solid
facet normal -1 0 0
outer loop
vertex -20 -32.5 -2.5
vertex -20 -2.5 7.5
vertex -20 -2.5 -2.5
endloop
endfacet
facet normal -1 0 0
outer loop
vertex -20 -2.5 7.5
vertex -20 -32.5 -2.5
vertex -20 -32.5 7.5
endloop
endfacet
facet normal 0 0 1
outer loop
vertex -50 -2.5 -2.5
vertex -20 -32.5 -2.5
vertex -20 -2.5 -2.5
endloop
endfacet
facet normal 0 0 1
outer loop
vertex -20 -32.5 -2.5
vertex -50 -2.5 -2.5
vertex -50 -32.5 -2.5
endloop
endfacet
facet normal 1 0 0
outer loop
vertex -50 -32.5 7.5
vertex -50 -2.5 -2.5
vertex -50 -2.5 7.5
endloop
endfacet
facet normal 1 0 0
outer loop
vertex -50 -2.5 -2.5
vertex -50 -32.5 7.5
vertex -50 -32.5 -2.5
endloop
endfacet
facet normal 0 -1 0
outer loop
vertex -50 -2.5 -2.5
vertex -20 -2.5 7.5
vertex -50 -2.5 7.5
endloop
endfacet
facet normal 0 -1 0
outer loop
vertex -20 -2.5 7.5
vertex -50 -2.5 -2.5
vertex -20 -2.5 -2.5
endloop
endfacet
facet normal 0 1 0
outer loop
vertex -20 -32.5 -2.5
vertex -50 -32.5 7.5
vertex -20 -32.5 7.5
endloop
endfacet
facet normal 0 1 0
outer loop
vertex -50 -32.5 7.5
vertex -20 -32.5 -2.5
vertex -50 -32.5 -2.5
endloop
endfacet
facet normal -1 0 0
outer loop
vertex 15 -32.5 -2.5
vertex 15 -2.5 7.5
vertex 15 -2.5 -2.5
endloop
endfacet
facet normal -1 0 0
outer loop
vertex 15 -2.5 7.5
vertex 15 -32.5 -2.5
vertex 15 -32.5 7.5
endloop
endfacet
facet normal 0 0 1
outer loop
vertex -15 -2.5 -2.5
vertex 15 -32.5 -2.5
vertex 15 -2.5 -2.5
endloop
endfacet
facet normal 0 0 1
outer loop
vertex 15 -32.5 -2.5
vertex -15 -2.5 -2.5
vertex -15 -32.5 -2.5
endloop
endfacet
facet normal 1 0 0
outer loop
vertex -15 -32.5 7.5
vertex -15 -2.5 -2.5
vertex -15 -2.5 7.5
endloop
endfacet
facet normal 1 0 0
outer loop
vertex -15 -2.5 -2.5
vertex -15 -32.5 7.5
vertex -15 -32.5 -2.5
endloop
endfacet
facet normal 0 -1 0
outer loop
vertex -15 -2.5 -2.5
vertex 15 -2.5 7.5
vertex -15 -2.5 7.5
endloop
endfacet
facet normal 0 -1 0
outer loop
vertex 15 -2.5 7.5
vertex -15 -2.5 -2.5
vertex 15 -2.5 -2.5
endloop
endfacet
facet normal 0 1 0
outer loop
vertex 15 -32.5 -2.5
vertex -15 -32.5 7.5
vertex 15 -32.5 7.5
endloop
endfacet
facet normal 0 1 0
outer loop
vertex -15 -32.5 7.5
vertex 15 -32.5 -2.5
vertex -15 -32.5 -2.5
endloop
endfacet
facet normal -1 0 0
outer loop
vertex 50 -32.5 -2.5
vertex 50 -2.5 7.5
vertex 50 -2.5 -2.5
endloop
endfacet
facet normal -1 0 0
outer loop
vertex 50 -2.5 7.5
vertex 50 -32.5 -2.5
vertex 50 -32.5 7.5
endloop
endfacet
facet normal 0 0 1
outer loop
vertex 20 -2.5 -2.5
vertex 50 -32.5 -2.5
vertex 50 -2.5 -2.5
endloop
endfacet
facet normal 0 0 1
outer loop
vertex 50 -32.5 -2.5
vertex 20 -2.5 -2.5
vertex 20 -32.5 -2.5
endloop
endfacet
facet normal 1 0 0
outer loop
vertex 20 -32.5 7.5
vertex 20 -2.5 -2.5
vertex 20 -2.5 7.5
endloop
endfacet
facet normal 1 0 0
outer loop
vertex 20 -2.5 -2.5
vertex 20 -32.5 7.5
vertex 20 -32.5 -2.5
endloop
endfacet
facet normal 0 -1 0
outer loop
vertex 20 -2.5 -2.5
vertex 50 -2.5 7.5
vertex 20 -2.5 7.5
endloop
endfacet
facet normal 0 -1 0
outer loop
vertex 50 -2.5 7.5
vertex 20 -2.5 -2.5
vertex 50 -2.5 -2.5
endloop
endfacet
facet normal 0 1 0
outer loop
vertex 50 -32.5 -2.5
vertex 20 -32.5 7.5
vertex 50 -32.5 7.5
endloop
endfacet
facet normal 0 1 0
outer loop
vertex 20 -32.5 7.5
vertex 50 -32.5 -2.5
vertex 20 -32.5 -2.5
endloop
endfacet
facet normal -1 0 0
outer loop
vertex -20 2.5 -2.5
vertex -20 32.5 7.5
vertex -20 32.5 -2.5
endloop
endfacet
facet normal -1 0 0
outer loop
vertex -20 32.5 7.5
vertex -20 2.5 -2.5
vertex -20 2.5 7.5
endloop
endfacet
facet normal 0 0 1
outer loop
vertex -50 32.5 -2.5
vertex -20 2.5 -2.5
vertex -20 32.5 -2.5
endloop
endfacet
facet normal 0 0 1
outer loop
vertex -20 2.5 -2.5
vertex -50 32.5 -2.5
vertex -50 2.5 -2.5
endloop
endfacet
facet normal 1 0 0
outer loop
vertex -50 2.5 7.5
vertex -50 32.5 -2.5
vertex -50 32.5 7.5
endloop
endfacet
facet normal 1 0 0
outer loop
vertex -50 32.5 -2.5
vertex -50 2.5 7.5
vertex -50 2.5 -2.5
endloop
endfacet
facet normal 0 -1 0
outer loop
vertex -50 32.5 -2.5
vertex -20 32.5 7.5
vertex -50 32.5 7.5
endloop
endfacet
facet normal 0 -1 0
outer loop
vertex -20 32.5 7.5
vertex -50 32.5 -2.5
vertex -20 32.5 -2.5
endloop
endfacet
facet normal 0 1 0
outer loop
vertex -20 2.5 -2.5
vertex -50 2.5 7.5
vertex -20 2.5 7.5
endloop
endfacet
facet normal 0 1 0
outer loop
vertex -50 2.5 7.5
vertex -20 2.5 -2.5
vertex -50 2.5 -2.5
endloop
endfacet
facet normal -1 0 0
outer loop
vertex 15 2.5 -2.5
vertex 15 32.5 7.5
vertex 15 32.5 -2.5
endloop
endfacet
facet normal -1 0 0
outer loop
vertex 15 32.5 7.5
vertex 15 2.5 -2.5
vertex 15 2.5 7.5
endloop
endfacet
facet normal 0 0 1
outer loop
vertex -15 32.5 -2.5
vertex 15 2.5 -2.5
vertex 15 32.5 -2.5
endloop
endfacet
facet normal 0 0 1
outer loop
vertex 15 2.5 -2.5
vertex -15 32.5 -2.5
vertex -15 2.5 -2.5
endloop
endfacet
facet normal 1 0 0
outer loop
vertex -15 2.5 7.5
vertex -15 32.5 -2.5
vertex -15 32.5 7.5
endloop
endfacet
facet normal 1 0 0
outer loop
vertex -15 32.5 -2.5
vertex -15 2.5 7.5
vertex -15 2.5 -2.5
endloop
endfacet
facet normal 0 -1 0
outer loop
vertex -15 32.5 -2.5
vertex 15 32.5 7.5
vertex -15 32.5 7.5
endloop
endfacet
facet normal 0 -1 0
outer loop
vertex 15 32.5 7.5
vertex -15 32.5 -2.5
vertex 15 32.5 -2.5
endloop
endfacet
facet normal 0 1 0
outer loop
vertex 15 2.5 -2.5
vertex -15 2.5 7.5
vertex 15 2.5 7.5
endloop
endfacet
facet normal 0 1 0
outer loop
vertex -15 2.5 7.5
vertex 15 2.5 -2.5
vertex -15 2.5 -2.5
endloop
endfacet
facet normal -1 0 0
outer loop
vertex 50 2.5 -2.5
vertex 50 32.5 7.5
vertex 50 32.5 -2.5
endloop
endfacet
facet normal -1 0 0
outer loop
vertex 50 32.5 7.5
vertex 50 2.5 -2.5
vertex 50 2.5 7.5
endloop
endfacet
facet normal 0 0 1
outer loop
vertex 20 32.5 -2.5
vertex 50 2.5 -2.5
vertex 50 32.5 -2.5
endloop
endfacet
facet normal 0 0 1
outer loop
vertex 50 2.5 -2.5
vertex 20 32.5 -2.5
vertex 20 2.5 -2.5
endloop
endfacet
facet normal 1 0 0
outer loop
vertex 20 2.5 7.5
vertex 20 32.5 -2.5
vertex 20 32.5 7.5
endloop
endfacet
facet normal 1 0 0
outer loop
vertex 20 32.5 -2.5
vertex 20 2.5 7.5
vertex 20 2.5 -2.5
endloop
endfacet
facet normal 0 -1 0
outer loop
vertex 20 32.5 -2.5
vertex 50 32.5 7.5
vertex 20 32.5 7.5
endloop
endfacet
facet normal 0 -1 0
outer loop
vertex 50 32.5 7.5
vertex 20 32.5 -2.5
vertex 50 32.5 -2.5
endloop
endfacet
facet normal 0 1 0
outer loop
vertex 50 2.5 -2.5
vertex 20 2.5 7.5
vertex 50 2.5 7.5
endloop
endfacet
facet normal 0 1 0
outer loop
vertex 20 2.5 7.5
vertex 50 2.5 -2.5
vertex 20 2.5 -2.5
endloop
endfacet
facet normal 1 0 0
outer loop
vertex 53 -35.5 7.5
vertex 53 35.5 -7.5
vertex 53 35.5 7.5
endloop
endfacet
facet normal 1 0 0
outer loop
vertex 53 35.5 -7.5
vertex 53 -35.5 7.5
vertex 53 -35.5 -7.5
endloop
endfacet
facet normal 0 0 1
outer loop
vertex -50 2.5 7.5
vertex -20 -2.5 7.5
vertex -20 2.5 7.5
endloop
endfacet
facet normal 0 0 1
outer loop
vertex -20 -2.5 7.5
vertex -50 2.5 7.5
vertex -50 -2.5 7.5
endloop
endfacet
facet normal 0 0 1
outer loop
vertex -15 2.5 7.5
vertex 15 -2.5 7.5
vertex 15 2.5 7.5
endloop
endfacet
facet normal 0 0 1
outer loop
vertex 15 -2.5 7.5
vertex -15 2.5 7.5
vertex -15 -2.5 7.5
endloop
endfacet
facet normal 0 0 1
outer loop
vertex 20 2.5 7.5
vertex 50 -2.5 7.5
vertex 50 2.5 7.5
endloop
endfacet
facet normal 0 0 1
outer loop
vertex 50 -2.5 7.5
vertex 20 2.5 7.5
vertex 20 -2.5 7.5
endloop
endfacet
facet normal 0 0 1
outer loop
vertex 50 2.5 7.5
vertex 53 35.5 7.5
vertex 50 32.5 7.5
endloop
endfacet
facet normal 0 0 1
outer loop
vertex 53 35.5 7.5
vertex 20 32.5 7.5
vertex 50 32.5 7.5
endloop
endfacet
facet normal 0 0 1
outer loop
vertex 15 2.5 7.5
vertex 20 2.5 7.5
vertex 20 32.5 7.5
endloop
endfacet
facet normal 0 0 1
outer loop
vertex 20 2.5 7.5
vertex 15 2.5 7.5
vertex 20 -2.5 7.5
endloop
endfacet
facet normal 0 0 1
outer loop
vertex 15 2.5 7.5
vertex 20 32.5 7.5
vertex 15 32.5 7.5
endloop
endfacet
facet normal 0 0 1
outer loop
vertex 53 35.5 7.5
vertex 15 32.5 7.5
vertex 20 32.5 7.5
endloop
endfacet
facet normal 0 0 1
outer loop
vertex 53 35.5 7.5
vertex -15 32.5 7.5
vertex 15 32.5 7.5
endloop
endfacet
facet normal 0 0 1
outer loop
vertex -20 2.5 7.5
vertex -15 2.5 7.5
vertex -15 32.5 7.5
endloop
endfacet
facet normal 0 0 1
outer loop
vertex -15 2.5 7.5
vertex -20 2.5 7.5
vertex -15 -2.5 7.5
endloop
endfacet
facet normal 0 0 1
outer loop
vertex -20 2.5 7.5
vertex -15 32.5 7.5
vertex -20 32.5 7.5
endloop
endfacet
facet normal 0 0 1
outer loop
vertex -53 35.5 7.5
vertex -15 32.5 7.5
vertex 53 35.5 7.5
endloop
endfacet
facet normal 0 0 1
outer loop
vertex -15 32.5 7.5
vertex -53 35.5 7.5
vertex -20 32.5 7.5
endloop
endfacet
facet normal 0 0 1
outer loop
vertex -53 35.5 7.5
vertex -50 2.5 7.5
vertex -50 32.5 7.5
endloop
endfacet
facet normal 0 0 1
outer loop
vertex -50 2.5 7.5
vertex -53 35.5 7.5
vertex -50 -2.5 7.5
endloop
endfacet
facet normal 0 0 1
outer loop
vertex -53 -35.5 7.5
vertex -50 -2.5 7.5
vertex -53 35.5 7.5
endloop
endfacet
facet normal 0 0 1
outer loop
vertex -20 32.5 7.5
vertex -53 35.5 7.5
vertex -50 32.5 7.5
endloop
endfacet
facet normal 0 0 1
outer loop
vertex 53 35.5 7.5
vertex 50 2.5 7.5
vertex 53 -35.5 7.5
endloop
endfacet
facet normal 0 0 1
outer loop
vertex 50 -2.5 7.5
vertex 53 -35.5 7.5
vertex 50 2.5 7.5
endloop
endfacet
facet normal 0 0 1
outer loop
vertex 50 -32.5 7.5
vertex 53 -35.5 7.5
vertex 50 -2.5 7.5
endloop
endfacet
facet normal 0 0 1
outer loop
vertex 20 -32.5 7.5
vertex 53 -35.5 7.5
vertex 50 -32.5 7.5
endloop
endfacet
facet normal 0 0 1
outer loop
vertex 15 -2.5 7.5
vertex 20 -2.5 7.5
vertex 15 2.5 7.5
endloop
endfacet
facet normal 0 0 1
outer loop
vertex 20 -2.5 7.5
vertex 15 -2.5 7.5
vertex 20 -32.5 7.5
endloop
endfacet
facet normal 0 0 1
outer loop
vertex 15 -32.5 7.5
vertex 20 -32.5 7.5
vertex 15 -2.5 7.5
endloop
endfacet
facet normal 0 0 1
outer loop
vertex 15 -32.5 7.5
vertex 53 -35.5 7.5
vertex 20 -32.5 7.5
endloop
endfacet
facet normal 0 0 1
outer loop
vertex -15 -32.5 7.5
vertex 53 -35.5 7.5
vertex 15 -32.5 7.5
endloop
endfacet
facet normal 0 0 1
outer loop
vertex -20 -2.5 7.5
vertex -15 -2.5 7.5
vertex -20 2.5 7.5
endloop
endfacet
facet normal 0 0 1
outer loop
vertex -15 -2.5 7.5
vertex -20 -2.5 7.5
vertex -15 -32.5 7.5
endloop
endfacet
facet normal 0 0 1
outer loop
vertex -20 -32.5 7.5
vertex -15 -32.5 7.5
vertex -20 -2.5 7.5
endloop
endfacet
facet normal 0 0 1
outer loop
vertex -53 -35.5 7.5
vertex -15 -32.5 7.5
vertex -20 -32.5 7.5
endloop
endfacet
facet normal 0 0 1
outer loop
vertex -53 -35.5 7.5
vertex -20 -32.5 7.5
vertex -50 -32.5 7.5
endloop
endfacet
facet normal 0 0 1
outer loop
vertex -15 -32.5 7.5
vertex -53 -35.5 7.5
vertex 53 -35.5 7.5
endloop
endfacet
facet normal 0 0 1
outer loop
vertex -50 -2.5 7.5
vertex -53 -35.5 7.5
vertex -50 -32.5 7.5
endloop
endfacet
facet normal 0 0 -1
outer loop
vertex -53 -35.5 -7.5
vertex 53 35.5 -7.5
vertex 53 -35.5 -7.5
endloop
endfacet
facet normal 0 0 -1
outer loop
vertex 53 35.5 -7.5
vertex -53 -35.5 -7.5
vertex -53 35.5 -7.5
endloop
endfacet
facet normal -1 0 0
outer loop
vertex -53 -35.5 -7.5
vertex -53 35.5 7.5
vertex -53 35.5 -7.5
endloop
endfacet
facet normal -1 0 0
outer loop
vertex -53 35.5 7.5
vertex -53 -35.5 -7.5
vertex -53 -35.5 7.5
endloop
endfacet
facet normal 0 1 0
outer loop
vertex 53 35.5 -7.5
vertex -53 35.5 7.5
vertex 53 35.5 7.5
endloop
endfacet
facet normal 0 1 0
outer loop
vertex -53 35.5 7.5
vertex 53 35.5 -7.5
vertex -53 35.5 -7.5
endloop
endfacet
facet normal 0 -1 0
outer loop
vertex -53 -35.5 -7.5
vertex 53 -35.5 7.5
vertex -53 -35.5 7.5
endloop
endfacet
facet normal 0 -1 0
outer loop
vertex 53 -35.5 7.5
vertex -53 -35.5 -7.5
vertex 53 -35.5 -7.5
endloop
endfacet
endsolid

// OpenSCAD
$fn = 32;

// ----------------------------------------------------------------------
// Pocket plate 106 x 71 x 15
// 2 x 3 pockets 30 mm square, 10 mm deep
// ----------------------------------------------------------------------

// --- parameters (mm) ---
thickness = 15;   // plate thickness
seat_tol = 0.15;  // tolerance at the seating features
free_tol = 0.5;   // general tolerance on the free sizes
floor_t = 5;      // material left under each pocket
pocket = 30;      // pocket side length
pitch_x = 35;     // pocket pitch along X
pitch_y = 35;     // pocket pitch along Y
cols = 3;         // pockets per row
rows = 2;         // rows of pockets

// --- derived feature positions (mm) ---
depth = thickness - floor_t;        // = 10   pocket depth, down to the floor
span_x = (cols - 1) * pitch_x;      // = 70   distance between outer pockets
span_y = (rows - 1) * pitch_y;      // = 35   distance between outer pocket rows
origin_x = -span_x / 2;             // = -35   X of the first pocket
origin_y = -span_y / 2;             // = -17.5   Y of the first pocket
plate = [span_x + pocket + 6, span_y + pocket + 6, thickness];  // = [106, 71, 15]   overall size: pockets plus 3 mm of wall on each side
feature_centers = [
  [origin_x + 0 * pitch_x, origin_y + 0 * pitch_y],
  [origin_x + 1 * pitch_x, origin_y + 0 * pitch_y],
  [origin_x + 2 * pitch_x, origin_y + 0 * pitch_y],
  [origin_x + 0 * pitch_x, origin_y + 1 * pitch_y],
  [origin_x + 1 * pitch_x, origin_y + 1 * pitch_y],
  [origin_x + 2 * pitch_x, origin_y + 1 * pitch_y]
];   // pocket centres, used verbatim by the cutter loop

// plate outline, then one pocket per centre in feature_centers
difference() {
  cube(plate, center = true);
  for (centre = feature_centers)
    translate([centre[0] - pocket / 2, centre[1] - pocket / 2, plate[2] / 2 - depth])
      cube([pocket, pocket, depth + 1]);  // centred on the declared pocket centre
}
